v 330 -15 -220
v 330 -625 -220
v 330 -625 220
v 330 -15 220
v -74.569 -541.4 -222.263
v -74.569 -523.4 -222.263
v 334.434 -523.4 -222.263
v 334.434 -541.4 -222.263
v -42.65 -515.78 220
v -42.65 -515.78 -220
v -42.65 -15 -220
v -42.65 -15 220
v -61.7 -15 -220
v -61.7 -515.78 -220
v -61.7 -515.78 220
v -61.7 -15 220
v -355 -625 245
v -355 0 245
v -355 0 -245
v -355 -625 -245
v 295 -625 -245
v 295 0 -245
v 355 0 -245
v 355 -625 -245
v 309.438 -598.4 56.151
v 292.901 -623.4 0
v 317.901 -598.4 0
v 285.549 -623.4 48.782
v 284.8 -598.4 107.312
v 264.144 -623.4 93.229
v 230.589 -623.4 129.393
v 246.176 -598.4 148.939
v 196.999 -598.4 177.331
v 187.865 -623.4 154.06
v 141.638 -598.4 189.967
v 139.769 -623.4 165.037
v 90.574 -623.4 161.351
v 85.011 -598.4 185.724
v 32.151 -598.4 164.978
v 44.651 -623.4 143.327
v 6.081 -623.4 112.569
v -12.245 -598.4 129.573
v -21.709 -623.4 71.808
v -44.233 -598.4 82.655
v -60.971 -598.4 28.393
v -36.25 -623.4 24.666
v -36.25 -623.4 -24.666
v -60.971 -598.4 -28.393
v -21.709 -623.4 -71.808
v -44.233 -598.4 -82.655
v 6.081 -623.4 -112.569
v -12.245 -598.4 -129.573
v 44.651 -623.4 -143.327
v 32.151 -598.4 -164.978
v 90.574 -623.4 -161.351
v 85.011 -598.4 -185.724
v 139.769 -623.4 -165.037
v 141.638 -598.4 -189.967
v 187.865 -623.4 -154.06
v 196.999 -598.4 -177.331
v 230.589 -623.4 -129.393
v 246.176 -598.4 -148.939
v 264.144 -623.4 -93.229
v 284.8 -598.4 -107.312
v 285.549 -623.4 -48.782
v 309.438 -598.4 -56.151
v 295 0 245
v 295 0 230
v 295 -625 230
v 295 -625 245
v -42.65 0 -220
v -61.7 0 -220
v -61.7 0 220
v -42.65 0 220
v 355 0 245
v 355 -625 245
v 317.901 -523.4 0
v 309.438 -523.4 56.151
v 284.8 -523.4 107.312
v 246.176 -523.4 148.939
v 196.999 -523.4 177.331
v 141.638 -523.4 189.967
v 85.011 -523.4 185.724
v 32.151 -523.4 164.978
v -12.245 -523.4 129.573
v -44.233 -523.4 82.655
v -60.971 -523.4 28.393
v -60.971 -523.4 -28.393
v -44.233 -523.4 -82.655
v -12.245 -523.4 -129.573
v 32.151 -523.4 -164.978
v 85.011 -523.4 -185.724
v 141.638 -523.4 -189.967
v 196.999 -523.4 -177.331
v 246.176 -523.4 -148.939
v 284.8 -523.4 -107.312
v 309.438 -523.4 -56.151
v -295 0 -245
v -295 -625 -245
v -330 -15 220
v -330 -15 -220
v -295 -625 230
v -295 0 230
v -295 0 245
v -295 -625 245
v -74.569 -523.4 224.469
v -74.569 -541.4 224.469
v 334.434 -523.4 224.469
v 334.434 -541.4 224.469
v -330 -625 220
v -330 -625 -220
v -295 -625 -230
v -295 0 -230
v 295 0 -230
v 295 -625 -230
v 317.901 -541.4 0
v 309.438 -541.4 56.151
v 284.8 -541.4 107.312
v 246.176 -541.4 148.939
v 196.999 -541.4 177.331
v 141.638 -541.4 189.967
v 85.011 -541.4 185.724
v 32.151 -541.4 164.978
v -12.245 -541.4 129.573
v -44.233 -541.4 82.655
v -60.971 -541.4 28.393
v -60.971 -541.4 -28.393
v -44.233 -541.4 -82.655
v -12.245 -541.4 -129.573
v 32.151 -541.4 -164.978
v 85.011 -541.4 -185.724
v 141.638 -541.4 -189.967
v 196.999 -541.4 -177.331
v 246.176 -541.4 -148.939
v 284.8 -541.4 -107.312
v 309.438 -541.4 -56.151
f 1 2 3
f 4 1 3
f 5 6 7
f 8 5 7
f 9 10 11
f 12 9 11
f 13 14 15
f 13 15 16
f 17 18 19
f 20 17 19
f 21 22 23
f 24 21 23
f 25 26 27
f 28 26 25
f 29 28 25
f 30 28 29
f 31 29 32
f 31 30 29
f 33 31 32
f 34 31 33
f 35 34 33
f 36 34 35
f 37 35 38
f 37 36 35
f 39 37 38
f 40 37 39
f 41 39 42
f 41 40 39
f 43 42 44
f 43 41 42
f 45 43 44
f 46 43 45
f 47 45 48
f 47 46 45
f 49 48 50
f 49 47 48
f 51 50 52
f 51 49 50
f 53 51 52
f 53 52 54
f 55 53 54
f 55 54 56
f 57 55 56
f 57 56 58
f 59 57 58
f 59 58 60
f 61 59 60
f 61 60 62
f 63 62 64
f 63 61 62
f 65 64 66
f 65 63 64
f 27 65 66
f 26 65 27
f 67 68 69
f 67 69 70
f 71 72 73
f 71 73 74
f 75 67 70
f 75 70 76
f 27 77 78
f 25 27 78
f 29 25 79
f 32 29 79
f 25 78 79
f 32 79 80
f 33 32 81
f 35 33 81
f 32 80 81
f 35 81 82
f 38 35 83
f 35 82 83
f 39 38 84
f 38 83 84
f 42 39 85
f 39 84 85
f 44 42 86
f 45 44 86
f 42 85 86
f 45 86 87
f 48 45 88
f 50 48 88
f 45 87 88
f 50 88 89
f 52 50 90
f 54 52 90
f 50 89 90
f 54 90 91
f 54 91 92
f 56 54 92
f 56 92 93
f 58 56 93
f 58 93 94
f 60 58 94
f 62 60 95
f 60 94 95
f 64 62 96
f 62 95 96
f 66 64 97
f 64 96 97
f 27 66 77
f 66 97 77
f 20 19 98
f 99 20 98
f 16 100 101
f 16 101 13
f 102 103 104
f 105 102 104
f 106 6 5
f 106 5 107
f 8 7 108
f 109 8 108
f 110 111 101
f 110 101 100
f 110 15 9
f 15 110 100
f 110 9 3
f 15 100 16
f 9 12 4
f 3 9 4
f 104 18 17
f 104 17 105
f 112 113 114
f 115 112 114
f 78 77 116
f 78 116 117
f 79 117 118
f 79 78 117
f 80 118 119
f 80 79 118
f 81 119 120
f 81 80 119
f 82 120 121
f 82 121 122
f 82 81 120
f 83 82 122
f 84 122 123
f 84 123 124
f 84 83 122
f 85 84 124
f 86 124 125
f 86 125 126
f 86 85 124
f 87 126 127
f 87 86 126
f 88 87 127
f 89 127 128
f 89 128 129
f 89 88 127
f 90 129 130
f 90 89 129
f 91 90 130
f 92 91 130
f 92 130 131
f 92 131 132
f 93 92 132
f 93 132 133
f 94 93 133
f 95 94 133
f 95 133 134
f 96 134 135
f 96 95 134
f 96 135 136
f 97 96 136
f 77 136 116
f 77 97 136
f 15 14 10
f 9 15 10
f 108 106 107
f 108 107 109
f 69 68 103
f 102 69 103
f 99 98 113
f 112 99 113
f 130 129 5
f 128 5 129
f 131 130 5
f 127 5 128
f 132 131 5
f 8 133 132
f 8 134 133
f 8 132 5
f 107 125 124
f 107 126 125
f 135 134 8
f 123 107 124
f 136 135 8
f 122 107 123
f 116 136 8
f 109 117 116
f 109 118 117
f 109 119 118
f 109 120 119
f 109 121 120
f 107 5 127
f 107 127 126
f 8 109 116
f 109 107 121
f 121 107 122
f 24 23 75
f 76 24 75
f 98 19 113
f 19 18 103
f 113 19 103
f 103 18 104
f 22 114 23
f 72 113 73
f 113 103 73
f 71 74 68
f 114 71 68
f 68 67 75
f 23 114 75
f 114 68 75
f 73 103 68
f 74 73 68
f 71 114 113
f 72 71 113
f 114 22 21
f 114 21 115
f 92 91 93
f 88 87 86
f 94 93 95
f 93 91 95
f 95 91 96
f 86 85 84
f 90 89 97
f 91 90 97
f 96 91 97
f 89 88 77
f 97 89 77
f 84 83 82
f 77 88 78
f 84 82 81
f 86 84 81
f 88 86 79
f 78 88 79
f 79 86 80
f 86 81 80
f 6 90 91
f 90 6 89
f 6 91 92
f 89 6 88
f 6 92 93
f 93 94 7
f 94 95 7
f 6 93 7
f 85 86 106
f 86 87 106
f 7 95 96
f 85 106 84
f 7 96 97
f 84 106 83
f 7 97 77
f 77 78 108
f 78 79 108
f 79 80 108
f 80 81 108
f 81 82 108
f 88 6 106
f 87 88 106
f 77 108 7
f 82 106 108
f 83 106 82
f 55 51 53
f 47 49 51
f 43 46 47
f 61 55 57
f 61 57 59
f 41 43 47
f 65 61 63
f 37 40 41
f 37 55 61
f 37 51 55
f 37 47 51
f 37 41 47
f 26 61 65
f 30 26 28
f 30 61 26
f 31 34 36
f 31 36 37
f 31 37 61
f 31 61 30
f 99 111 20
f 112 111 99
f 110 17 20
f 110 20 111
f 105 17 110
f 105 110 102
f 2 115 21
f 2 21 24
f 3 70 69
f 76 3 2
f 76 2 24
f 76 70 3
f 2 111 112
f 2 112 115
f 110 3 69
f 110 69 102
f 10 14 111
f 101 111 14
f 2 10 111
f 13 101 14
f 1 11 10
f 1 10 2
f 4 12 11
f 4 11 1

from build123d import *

# Parameters (mm, degrees)
F0_W     = 60
F0_H     = 15
F0_W_2   = 660
F0_H_2   = 440
F1_DEPTH = 625
F2_DEPTH = 15
F4_R     = 190.5
F5_DEPTH = 100
F6_SIZE  = 25
F4_W     = 409.003091
F4_H     = 446.732346
F7_DEPTH = 18
F8_W     = 19.05
F8_H     = 515.78
F9_DEPTH = 440


with BuildPart() as f1:
    # F0 (on Front) → F1 (new body)
    with BuildSketch(Plane.XZ):
        with Locations((-325, 237.5)):
            Rectangle(F0_W, F0_H)
        with Locations((325, 237.5)):
            Rectangle(F0_W, F0_H)
        with Locations((325, -237.5)):
            Rectangle(F0_W, F0_H)
        with Locations((-325, -237.5)):
            Rectangle(F0_W, F0_H)
        Polygon((-295, 230), (-355, 230), (-355, -230), (-295, -230), (295, -230), (355, -230), (355, 230), (295, 230), align=None)
        Rectangle(F0_W_2, F0_H_2, mode=Mode.SUBTRACT)
    extrude(amount=F1_DEPTH)

    # F0 (on Front) → F2 (join)
    with BuildSketch(Plane.XZ):
        Polygon((-295, 230), (-355, 230), (-355, -230), (-295, -230), (295, -230), (355, -230), (355, 230), (295, 230), align=None)
        Rectangle(F0_W_2, F0_H_2, mode=Mode.SUBTRACT)
        Rectangle(F0_W_2, F0_H_2)
    extrude(amount=F2_DEPTH)

    # F8 (on face) → F9 (join)
    with BuildSketch(Plane.XY.offset(-220)):
        with Locations((-52.174994, -257.889972)):
            Rectangle(F8_W, F8_H)
    extrude(amount=F9_DEPTH)


with BuildPart() as f5:
    # F4 (on offset) → F5 (new body)
    with BuildSketch(Plane.XZ.offset(523.4)):
        with Locations((127.401441, 0)):
            Circle(F4_R)
    extrude(amount=F5_DEPTH)

    # F6
    f6_edges = [f5.edges().sort_by_distance(p)[0] for p in [
        (-63.098559, -623.4, 0),
    ]]
    chamfer(f6_edges, length=F6_SIZE)


with BuildPart() as f7:
    # F4 (on offset) → F7 (new body)
    with BuildSketch(Plane.XZ.offset(523.4)):
        with Locations((129.932407, 1.103047)):
            Rectangle(F4_W, F4_H)
        with Locations((127.401441, 0)):
            Circle(F4_R, mode=Mode.SUBTRACT)
    extrude(amount=F7_DEPTH)


solid = Compound([f1.part, f5.part, f7.part])
